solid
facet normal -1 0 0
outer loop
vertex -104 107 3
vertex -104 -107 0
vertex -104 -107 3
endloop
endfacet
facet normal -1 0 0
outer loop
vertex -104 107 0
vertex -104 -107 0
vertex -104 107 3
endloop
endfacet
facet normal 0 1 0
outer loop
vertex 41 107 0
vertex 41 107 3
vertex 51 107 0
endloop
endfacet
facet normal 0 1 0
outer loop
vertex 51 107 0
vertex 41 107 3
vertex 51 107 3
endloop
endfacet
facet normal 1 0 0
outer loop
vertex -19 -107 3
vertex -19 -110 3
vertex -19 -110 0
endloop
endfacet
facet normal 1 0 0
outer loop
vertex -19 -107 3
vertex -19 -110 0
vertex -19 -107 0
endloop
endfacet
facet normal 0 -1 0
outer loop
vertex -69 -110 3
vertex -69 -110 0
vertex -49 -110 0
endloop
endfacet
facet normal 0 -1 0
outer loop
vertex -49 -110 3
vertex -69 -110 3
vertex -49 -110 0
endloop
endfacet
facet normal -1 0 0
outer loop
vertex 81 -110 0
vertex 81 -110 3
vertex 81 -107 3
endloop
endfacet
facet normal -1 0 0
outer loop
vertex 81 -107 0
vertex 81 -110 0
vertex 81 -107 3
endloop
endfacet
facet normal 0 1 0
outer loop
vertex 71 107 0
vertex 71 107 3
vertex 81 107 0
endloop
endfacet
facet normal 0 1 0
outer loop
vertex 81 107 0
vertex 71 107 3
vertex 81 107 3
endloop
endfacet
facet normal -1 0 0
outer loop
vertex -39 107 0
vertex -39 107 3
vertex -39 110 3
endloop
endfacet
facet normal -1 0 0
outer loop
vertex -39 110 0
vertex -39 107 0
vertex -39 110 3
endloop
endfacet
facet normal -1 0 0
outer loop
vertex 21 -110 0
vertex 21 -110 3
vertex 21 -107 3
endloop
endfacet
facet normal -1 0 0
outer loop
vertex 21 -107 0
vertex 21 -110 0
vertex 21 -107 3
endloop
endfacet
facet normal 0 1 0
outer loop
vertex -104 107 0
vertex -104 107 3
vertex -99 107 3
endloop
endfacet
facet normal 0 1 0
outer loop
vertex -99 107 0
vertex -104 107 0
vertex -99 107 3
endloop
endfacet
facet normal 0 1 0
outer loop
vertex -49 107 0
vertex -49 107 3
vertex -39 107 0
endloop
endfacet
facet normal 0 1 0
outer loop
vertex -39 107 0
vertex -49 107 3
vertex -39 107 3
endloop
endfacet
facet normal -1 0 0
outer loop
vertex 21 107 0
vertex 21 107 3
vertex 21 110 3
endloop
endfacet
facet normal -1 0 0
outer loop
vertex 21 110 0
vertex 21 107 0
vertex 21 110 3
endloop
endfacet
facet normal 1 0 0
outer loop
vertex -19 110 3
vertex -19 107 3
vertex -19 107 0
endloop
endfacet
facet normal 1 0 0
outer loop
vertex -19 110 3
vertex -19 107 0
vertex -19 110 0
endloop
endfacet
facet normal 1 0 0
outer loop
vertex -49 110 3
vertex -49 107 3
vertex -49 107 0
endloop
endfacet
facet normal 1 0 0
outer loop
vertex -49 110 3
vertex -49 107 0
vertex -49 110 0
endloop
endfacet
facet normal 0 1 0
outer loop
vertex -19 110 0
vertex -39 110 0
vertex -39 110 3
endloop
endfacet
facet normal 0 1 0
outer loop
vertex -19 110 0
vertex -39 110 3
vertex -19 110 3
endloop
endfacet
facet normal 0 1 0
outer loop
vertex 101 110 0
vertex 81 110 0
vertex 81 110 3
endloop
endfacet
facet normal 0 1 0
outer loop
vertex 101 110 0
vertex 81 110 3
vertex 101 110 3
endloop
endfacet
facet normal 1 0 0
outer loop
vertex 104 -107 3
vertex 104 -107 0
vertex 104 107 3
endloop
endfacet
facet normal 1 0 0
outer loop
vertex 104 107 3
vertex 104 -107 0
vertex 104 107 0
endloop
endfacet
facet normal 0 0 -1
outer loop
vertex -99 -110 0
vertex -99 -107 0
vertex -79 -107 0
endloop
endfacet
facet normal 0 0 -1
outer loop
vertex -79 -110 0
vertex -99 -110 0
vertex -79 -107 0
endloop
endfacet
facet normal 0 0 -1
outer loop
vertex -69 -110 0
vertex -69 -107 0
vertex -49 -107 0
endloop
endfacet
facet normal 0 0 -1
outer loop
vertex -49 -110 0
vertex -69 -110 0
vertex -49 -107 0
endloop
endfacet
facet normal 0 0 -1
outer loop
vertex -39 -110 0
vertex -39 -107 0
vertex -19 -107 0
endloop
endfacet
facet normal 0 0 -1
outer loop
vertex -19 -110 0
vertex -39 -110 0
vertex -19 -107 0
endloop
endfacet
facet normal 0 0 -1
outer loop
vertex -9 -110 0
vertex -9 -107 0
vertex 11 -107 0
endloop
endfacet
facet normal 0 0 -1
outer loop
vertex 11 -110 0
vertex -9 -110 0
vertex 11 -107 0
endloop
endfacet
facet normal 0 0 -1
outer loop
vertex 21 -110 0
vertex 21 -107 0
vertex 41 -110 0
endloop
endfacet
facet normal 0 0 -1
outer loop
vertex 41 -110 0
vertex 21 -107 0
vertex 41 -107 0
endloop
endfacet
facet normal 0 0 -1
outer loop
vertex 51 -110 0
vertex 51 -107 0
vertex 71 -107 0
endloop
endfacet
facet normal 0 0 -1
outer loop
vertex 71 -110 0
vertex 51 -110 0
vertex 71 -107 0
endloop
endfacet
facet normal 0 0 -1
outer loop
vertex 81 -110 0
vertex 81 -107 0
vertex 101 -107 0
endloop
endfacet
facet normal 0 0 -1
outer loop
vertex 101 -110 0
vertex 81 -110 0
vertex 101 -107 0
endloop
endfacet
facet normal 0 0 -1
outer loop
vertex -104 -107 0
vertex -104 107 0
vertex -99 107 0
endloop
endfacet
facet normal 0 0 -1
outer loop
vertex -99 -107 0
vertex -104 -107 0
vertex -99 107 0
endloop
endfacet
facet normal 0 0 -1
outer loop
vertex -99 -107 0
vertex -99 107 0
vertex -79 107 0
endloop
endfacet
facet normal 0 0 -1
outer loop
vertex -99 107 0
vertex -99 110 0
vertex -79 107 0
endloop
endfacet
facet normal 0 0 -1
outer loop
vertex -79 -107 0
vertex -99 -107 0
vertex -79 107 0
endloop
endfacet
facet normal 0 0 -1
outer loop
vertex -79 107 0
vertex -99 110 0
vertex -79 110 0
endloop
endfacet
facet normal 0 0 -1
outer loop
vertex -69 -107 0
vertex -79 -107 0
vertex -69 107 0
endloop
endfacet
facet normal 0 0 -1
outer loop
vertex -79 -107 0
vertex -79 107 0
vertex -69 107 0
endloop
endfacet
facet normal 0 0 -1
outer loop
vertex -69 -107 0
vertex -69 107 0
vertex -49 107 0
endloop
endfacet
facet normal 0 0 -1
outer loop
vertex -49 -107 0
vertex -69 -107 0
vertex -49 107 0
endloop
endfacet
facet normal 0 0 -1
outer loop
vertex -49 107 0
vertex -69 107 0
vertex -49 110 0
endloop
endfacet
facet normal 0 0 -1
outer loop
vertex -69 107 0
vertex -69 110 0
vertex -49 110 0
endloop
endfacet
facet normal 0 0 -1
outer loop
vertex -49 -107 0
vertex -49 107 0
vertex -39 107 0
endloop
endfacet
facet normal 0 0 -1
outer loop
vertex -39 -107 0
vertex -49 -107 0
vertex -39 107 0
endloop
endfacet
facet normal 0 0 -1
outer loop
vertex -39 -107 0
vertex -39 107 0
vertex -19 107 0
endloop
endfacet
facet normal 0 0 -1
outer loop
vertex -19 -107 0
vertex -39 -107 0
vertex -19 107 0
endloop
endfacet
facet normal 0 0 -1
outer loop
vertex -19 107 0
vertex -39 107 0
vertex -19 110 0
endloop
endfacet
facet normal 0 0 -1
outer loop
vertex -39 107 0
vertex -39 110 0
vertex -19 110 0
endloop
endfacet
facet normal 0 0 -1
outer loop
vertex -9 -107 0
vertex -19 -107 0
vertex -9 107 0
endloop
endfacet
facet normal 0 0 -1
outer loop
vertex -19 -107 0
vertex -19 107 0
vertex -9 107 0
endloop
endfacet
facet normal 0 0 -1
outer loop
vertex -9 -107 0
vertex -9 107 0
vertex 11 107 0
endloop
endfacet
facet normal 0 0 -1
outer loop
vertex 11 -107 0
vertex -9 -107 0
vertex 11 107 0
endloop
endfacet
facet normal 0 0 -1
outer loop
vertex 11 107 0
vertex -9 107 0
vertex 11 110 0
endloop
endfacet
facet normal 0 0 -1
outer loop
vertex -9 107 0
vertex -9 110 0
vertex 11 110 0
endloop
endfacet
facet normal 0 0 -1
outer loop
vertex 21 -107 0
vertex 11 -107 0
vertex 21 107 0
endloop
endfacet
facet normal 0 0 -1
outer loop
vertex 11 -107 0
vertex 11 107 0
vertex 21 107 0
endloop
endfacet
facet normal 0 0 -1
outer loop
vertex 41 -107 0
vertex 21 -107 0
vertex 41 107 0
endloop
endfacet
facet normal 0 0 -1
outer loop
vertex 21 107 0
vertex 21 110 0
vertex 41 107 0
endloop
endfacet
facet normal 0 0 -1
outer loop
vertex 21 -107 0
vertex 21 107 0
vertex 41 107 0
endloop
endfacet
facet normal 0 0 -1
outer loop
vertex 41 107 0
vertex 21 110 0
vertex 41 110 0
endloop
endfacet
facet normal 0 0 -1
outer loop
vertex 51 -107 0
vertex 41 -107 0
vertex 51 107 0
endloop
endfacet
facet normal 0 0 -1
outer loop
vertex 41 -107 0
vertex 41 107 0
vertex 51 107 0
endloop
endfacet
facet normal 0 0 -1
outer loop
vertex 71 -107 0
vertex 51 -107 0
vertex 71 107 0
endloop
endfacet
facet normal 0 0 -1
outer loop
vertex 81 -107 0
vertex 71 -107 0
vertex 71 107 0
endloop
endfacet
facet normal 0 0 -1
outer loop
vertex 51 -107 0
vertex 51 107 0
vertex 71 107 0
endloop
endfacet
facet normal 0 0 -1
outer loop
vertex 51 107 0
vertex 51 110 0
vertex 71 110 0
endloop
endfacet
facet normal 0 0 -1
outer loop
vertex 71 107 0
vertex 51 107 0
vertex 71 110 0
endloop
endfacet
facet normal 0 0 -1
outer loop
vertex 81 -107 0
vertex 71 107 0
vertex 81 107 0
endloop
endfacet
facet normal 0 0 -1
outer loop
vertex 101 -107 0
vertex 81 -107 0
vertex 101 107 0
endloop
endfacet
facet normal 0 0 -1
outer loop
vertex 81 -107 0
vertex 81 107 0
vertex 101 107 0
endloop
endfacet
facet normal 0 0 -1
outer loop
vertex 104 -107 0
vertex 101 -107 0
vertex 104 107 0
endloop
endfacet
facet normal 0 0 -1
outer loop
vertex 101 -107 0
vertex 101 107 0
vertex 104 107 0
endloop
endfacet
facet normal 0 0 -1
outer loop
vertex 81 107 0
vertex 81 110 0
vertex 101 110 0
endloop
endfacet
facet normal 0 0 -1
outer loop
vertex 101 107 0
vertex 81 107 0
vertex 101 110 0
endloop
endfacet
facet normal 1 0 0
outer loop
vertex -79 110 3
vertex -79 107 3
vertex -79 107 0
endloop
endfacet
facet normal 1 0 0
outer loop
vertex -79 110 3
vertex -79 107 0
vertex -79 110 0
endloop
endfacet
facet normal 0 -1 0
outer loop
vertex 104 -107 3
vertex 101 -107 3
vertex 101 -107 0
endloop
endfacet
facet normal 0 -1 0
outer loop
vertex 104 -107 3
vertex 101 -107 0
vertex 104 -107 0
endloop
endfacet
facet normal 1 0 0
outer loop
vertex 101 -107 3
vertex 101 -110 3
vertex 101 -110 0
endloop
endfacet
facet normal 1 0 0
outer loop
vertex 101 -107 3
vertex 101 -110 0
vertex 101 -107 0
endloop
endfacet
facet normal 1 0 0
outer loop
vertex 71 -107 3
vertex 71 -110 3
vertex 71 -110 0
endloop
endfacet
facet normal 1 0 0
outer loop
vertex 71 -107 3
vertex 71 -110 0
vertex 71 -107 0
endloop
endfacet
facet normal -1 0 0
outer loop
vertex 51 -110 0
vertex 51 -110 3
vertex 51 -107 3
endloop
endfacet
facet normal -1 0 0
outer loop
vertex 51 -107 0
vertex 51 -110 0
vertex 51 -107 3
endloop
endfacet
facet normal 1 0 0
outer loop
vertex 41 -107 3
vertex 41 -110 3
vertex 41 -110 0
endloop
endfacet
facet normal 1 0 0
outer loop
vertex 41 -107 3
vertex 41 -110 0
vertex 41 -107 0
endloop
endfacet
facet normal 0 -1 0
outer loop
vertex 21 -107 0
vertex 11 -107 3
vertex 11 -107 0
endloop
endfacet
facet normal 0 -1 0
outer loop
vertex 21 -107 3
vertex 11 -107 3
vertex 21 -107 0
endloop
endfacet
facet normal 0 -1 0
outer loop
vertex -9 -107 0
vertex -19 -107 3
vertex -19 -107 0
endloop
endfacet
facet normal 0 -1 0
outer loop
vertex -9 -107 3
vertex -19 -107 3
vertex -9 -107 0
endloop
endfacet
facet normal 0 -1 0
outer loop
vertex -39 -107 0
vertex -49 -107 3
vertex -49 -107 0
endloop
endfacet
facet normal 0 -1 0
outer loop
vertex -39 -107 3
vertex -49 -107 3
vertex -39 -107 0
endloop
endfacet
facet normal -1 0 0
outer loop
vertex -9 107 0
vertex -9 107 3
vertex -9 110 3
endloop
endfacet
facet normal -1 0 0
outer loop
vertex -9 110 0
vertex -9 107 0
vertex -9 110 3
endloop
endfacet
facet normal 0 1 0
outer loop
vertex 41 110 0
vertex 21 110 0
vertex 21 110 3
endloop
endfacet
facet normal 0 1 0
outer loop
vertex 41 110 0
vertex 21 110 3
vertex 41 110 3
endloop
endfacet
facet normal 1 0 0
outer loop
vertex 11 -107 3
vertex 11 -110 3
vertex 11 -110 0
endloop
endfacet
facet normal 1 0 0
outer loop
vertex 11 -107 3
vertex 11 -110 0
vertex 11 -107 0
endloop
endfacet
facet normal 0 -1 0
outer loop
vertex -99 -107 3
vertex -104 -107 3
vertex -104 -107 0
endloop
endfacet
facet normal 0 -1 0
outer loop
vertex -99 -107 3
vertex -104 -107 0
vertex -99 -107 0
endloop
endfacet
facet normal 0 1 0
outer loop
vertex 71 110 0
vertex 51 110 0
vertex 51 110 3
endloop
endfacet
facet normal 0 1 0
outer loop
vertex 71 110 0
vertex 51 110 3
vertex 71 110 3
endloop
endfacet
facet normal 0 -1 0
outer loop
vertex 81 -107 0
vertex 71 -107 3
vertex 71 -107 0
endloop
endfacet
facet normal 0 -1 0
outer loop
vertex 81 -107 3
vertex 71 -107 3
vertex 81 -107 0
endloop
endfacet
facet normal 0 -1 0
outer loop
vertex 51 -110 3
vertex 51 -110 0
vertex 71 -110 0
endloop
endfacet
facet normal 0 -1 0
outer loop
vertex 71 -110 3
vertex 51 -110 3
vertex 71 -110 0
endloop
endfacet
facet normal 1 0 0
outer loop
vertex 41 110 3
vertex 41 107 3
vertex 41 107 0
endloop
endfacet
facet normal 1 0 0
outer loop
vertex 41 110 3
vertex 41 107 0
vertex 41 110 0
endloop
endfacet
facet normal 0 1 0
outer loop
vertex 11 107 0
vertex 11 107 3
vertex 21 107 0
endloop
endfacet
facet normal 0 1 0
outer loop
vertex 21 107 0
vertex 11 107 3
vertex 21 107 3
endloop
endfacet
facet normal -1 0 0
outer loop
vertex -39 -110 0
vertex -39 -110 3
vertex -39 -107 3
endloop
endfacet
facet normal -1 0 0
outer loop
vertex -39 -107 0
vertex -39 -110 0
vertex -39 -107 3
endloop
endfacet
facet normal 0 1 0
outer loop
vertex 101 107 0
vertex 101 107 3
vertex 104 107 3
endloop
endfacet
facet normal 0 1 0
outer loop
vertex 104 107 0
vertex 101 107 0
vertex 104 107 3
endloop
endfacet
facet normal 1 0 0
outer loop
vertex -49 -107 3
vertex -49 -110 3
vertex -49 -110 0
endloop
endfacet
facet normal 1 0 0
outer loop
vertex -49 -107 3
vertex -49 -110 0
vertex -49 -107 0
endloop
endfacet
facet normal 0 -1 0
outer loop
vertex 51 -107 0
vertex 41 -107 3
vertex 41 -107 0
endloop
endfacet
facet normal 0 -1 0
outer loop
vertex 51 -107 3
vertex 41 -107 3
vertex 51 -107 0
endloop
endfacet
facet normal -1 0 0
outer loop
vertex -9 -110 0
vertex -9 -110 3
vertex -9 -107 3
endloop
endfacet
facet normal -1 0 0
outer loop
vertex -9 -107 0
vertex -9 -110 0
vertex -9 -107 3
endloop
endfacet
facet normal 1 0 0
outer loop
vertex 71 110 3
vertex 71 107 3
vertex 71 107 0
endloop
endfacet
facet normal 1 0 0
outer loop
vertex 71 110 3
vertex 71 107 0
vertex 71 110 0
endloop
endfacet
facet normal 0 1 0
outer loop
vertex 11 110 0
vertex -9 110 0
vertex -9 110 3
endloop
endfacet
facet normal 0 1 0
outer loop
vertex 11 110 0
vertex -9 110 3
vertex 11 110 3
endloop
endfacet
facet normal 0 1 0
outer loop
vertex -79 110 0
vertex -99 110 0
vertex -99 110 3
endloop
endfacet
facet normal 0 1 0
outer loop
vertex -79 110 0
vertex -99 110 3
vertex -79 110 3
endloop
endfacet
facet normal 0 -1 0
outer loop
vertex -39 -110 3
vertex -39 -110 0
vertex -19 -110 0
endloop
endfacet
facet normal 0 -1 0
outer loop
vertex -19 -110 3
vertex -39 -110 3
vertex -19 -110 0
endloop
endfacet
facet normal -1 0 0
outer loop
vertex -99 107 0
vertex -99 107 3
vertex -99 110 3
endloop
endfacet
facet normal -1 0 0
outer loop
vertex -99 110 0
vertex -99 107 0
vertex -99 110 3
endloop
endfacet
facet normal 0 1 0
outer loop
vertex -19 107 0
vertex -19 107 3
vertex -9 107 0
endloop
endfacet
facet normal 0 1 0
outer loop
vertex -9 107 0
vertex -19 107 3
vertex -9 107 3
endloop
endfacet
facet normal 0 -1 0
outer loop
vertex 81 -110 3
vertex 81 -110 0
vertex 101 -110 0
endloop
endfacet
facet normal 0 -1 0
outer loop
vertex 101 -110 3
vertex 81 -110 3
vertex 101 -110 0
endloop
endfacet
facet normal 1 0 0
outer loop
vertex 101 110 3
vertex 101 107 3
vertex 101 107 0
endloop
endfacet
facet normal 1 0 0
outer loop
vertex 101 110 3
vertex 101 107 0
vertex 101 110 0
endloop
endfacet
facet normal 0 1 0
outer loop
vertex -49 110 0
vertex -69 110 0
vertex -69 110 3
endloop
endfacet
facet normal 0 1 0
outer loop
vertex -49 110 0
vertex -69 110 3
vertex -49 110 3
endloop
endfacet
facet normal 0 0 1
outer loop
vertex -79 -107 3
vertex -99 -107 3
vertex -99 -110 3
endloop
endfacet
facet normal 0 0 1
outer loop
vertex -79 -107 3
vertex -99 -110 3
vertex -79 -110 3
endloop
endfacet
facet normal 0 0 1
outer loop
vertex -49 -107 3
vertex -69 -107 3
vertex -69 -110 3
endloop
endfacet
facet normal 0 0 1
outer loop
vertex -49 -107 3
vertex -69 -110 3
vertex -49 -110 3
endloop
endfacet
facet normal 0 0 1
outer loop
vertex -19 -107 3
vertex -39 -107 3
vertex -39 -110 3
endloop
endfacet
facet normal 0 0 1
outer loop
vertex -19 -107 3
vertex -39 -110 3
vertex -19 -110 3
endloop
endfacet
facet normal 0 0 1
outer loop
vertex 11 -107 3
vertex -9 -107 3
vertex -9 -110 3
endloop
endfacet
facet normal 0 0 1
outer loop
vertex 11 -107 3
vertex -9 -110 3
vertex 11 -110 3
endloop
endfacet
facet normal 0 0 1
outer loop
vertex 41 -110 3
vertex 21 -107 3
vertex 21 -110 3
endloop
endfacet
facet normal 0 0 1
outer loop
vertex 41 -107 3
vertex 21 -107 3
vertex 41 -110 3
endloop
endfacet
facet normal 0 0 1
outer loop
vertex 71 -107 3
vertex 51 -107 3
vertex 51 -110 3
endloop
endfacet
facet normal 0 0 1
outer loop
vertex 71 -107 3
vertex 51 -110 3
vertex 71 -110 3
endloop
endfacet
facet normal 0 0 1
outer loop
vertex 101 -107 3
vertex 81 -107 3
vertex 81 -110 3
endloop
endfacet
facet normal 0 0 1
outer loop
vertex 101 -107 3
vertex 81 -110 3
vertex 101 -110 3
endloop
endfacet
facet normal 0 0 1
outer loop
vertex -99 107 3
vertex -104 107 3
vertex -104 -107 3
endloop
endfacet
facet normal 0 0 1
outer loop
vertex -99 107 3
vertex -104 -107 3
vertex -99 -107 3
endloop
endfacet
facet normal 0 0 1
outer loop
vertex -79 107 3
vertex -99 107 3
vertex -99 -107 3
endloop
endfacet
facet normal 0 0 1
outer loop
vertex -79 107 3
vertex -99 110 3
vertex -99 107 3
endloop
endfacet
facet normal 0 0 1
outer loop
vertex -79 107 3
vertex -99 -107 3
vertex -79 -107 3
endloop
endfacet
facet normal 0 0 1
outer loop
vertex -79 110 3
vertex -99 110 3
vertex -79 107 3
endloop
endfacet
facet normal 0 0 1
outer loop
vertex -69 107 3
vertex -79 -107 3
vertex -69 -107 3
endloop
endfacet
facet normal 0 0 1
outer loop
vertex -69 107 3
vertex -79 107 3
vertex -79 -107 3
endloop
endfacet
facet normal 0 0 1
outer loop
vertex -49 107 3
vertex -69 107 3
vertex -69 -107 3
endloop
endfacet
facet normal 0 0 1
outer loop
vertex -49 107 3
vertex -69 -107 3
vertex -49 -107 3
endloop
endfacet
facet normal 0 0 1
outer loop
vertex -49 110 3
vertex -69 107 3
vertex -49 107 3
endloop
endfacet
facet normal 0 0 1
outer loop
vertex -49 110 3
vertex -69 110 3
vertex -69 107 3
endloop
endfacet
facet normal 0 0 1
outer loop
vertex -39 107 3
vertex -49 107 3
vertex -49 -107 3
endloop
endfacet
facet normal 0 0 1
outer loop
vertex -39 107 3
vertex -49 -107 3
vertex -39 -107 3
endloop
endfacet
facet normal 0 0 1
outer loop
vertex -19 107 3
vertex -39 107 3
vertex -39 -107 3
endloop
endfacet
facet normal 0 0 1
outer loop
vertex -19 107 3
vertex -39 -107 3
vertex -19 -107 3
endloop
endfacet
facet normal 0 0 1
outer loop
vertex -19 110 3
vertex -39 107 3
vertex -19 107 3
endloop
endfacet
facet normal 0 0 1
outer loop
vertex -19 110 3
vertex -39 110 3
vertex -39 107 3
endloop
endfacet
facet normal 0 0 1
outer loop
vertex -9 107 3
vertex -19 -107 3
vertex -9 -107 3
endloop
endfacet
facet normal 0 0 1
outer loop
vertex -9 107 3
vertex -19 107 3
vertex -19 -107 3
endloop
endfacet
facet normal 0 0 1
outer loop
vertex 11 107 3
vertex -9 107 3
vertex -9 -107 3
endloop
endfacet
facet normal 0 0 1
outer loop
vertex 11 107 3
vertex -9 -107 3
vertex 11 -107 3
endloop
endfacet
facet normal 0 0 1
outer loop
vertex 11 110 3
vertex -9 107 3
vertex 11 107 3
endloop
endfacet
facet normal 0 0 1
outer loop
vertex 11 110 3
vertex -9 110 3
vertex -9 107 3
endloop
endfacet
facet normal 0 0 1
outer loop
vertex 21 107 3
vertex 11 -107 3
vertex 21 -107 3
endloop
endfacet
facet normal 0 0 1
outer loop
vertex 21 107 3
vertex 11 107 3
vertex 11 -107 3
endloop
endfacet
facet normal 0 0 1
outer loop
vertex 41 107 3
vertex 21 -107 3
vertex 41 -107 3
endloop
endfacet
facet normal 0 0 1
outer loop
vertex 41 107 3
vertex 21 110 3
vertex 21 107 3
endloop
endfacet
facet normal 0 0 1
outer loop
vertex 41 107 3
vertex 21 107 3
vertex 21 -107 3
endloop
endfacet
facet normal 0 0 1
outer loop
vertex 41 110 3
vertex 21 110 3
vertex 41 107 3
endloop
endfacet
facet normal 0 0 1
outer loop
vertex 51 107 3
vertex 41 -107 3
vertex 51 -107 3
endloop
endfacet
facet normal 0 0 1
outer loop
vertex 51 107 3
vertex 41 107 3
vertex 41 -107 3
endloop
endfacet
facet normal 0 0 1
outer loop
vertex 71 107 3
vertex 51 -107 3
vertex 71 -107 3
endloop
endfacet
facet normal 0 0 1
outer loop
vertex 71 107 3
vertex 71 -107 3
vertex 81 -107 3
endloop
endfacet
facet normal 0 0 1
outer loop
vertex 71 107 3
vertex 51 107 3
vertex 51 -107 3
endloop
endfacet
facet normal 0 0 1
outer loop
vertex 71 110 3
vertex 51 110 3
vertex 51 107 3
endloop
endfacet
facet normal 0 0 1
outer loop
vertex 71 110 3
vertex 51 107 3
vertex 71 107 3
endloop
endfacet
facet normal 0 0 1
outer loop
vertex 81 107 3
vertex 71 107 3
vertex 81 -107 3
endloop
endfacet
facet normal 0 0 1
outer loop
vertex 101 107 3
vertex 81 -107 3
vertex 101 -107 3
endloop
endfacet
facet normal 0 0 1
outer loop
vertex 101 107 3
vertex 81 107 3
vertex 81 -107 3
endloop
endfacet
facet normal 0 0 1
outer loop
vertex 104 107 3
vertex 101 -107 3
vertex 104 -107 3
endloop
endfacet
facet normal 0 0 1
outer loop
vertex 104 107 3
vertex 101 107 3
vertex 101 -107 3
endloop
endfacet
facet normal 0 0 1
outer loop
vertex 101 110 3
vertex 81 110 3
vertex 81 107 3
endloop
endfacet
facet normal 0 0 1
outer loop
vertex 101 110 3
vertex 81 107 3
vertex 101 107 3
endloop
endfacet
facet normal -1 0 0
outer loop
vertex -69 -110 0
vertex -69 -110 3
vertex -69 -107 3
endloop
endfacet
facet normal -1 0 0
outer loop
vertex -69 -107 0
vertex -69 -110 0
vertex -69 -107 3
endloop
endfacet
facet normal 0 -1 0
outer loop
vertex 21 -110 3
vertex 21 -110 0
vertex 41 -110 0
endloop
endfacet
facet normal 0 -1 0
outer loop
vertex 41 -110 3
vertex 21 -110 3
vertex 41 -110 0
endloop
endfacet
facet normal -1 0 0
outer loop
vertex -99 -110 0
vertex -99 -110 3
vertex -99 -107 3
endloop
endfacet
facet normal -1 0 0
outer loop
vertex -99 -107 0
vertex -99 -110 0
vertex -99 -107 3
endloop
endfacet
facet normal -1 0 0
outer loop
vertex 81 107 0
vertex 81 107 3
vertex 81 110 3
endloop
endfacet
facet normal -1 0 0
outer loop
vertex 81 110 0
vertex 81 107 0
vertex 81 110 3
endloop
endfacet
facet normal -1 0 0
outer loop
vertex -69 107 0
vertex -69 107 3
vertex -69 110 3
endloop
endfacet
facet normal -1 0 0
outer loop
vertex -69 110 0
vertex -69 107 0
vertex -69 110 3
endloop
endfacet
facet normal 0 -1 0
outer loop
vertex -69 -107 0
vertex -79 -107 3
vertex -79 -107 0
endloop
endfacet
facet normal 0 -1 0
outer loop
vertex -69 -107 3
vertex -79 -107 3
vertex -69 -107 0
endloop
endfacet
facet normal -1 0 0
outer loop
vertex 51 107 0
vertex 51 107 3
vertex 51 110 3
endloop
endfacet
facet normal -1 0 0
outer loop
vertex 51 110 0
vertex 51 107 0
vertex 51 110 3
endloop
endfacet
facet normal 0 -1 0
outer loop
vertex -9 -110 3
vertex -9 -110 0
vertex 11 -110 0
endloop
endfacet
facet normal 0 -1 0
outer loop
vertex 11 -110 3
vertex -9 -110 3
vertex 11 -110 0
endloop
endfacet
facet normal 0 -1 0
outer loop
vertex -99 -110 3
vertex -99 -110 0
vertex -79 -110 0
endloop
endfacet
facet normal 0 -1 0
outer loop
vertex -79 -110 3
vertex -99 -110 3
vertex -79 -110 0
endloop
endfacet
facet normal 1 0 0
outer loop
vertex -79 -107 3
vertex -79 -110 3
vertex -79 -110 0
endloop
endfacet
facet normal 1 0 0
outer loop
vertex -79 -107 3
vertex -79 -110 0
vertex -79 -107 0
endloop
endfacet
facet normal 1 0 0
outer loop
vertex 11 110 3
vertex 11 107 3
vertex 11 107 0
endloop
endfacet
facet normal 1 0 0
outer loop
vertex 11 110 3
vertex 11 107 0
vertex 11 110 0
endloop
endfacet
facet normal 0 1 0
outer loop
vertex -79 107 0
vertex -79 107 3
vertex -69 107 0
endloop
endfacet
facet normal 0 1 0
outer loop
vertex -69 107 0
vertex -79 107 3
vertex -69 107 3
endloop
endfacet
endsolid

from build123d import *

# Parameters (mm, degrees)
ESQUISSE1_W             = 208
ESQUISSE1_H             = 220
BOSS_EXTRU_1_DEPTH      = 3
ESQUISSE2_W             = 10
ESQUISSE2_H             = 3
ENL_V_MAT_EXTRU_1_DEPTH = 3


with BuildPart() as part:
    # Esquisse1 → Boss.-Extru.1 (new body)
    with BuildSketch(Plane.XY):
        Rectangle(ESQUISSE1_W, ESQUISSE1_H)
    extrude(amount=BOSS_EXTRU_1_DEPTH)

    # Esquisse2 → Enlèv. mat.-Extru.1 (cut)
    with BuildSketch(Plane.XY.offset(3)):
        with Locations((-104, 108.5)):
            Rectangle(ESQUISSE2_W, ESQUISSE2_H)
        with Locations((-74, 108.5)):
            Rectangle(ESQUISSE2_W, ESQUISSE2_H)
        with Locations((-44, 108.5)):
            Rectangle(ESQUISSE2_W, ESQUISSE2_H)
        with Locations((-14, 108.5)):
            Rectangle(ESQUISSE2_W, ESQUISSE2_H)
        with Locations((16, 108.5)):
            Rectangle(ESQUISSE2_W, ESQUISSE2_H)
        with Locations((46, 108.5)):
            Rectangle(ESQUISSE2_W, ESQUISSE2_H)
        with Locations((76, 108.5)):
            Rectangle(ESQUISSE2_W, ESQUISSE2_H)
        with Locations((106, 108.5)):
            Rectangle(ESQUISSE2_W, ESQUISSE2_H)
        with Locations((106, -108.5)):
            Rectangle(ESQUISSE2_W, ESQUISSE2_H)
        with Locations((76, -108.5)):
            Rectangle(ESQUISSE2_W, ESQUISSE2_H)
        with Locations((46, -108.5)):
            Rectangle(ESQUISSE2_W, ESQUISSE2_H)
        with Locations((16, -108.5)):
            Rectangle(ESQUISSE2_W, ESQUISSE2_H)
        with Locations((-14, -108.5)):
            Rectangle(ESQUISSE2_W, ESQUISSE2_H)
        with Locations((-44, -108.5)):
            Rectangle(ESQUISSE2_W, ESQUISSE2_H)
        with Locations((-74, -108.5)):
            Rectangle(ESQUISSE2_W, ESQUISSE2_H)
        with Locations((-104, -108.5)):
            Rectangle(ESQUISSE2_W, ESQUISSE2_H)
    extrude(amount=-ENL_V_MAT_EXTRU_1_DEPTH, mode=Mode.SUBTRACT)


solid = part.part
